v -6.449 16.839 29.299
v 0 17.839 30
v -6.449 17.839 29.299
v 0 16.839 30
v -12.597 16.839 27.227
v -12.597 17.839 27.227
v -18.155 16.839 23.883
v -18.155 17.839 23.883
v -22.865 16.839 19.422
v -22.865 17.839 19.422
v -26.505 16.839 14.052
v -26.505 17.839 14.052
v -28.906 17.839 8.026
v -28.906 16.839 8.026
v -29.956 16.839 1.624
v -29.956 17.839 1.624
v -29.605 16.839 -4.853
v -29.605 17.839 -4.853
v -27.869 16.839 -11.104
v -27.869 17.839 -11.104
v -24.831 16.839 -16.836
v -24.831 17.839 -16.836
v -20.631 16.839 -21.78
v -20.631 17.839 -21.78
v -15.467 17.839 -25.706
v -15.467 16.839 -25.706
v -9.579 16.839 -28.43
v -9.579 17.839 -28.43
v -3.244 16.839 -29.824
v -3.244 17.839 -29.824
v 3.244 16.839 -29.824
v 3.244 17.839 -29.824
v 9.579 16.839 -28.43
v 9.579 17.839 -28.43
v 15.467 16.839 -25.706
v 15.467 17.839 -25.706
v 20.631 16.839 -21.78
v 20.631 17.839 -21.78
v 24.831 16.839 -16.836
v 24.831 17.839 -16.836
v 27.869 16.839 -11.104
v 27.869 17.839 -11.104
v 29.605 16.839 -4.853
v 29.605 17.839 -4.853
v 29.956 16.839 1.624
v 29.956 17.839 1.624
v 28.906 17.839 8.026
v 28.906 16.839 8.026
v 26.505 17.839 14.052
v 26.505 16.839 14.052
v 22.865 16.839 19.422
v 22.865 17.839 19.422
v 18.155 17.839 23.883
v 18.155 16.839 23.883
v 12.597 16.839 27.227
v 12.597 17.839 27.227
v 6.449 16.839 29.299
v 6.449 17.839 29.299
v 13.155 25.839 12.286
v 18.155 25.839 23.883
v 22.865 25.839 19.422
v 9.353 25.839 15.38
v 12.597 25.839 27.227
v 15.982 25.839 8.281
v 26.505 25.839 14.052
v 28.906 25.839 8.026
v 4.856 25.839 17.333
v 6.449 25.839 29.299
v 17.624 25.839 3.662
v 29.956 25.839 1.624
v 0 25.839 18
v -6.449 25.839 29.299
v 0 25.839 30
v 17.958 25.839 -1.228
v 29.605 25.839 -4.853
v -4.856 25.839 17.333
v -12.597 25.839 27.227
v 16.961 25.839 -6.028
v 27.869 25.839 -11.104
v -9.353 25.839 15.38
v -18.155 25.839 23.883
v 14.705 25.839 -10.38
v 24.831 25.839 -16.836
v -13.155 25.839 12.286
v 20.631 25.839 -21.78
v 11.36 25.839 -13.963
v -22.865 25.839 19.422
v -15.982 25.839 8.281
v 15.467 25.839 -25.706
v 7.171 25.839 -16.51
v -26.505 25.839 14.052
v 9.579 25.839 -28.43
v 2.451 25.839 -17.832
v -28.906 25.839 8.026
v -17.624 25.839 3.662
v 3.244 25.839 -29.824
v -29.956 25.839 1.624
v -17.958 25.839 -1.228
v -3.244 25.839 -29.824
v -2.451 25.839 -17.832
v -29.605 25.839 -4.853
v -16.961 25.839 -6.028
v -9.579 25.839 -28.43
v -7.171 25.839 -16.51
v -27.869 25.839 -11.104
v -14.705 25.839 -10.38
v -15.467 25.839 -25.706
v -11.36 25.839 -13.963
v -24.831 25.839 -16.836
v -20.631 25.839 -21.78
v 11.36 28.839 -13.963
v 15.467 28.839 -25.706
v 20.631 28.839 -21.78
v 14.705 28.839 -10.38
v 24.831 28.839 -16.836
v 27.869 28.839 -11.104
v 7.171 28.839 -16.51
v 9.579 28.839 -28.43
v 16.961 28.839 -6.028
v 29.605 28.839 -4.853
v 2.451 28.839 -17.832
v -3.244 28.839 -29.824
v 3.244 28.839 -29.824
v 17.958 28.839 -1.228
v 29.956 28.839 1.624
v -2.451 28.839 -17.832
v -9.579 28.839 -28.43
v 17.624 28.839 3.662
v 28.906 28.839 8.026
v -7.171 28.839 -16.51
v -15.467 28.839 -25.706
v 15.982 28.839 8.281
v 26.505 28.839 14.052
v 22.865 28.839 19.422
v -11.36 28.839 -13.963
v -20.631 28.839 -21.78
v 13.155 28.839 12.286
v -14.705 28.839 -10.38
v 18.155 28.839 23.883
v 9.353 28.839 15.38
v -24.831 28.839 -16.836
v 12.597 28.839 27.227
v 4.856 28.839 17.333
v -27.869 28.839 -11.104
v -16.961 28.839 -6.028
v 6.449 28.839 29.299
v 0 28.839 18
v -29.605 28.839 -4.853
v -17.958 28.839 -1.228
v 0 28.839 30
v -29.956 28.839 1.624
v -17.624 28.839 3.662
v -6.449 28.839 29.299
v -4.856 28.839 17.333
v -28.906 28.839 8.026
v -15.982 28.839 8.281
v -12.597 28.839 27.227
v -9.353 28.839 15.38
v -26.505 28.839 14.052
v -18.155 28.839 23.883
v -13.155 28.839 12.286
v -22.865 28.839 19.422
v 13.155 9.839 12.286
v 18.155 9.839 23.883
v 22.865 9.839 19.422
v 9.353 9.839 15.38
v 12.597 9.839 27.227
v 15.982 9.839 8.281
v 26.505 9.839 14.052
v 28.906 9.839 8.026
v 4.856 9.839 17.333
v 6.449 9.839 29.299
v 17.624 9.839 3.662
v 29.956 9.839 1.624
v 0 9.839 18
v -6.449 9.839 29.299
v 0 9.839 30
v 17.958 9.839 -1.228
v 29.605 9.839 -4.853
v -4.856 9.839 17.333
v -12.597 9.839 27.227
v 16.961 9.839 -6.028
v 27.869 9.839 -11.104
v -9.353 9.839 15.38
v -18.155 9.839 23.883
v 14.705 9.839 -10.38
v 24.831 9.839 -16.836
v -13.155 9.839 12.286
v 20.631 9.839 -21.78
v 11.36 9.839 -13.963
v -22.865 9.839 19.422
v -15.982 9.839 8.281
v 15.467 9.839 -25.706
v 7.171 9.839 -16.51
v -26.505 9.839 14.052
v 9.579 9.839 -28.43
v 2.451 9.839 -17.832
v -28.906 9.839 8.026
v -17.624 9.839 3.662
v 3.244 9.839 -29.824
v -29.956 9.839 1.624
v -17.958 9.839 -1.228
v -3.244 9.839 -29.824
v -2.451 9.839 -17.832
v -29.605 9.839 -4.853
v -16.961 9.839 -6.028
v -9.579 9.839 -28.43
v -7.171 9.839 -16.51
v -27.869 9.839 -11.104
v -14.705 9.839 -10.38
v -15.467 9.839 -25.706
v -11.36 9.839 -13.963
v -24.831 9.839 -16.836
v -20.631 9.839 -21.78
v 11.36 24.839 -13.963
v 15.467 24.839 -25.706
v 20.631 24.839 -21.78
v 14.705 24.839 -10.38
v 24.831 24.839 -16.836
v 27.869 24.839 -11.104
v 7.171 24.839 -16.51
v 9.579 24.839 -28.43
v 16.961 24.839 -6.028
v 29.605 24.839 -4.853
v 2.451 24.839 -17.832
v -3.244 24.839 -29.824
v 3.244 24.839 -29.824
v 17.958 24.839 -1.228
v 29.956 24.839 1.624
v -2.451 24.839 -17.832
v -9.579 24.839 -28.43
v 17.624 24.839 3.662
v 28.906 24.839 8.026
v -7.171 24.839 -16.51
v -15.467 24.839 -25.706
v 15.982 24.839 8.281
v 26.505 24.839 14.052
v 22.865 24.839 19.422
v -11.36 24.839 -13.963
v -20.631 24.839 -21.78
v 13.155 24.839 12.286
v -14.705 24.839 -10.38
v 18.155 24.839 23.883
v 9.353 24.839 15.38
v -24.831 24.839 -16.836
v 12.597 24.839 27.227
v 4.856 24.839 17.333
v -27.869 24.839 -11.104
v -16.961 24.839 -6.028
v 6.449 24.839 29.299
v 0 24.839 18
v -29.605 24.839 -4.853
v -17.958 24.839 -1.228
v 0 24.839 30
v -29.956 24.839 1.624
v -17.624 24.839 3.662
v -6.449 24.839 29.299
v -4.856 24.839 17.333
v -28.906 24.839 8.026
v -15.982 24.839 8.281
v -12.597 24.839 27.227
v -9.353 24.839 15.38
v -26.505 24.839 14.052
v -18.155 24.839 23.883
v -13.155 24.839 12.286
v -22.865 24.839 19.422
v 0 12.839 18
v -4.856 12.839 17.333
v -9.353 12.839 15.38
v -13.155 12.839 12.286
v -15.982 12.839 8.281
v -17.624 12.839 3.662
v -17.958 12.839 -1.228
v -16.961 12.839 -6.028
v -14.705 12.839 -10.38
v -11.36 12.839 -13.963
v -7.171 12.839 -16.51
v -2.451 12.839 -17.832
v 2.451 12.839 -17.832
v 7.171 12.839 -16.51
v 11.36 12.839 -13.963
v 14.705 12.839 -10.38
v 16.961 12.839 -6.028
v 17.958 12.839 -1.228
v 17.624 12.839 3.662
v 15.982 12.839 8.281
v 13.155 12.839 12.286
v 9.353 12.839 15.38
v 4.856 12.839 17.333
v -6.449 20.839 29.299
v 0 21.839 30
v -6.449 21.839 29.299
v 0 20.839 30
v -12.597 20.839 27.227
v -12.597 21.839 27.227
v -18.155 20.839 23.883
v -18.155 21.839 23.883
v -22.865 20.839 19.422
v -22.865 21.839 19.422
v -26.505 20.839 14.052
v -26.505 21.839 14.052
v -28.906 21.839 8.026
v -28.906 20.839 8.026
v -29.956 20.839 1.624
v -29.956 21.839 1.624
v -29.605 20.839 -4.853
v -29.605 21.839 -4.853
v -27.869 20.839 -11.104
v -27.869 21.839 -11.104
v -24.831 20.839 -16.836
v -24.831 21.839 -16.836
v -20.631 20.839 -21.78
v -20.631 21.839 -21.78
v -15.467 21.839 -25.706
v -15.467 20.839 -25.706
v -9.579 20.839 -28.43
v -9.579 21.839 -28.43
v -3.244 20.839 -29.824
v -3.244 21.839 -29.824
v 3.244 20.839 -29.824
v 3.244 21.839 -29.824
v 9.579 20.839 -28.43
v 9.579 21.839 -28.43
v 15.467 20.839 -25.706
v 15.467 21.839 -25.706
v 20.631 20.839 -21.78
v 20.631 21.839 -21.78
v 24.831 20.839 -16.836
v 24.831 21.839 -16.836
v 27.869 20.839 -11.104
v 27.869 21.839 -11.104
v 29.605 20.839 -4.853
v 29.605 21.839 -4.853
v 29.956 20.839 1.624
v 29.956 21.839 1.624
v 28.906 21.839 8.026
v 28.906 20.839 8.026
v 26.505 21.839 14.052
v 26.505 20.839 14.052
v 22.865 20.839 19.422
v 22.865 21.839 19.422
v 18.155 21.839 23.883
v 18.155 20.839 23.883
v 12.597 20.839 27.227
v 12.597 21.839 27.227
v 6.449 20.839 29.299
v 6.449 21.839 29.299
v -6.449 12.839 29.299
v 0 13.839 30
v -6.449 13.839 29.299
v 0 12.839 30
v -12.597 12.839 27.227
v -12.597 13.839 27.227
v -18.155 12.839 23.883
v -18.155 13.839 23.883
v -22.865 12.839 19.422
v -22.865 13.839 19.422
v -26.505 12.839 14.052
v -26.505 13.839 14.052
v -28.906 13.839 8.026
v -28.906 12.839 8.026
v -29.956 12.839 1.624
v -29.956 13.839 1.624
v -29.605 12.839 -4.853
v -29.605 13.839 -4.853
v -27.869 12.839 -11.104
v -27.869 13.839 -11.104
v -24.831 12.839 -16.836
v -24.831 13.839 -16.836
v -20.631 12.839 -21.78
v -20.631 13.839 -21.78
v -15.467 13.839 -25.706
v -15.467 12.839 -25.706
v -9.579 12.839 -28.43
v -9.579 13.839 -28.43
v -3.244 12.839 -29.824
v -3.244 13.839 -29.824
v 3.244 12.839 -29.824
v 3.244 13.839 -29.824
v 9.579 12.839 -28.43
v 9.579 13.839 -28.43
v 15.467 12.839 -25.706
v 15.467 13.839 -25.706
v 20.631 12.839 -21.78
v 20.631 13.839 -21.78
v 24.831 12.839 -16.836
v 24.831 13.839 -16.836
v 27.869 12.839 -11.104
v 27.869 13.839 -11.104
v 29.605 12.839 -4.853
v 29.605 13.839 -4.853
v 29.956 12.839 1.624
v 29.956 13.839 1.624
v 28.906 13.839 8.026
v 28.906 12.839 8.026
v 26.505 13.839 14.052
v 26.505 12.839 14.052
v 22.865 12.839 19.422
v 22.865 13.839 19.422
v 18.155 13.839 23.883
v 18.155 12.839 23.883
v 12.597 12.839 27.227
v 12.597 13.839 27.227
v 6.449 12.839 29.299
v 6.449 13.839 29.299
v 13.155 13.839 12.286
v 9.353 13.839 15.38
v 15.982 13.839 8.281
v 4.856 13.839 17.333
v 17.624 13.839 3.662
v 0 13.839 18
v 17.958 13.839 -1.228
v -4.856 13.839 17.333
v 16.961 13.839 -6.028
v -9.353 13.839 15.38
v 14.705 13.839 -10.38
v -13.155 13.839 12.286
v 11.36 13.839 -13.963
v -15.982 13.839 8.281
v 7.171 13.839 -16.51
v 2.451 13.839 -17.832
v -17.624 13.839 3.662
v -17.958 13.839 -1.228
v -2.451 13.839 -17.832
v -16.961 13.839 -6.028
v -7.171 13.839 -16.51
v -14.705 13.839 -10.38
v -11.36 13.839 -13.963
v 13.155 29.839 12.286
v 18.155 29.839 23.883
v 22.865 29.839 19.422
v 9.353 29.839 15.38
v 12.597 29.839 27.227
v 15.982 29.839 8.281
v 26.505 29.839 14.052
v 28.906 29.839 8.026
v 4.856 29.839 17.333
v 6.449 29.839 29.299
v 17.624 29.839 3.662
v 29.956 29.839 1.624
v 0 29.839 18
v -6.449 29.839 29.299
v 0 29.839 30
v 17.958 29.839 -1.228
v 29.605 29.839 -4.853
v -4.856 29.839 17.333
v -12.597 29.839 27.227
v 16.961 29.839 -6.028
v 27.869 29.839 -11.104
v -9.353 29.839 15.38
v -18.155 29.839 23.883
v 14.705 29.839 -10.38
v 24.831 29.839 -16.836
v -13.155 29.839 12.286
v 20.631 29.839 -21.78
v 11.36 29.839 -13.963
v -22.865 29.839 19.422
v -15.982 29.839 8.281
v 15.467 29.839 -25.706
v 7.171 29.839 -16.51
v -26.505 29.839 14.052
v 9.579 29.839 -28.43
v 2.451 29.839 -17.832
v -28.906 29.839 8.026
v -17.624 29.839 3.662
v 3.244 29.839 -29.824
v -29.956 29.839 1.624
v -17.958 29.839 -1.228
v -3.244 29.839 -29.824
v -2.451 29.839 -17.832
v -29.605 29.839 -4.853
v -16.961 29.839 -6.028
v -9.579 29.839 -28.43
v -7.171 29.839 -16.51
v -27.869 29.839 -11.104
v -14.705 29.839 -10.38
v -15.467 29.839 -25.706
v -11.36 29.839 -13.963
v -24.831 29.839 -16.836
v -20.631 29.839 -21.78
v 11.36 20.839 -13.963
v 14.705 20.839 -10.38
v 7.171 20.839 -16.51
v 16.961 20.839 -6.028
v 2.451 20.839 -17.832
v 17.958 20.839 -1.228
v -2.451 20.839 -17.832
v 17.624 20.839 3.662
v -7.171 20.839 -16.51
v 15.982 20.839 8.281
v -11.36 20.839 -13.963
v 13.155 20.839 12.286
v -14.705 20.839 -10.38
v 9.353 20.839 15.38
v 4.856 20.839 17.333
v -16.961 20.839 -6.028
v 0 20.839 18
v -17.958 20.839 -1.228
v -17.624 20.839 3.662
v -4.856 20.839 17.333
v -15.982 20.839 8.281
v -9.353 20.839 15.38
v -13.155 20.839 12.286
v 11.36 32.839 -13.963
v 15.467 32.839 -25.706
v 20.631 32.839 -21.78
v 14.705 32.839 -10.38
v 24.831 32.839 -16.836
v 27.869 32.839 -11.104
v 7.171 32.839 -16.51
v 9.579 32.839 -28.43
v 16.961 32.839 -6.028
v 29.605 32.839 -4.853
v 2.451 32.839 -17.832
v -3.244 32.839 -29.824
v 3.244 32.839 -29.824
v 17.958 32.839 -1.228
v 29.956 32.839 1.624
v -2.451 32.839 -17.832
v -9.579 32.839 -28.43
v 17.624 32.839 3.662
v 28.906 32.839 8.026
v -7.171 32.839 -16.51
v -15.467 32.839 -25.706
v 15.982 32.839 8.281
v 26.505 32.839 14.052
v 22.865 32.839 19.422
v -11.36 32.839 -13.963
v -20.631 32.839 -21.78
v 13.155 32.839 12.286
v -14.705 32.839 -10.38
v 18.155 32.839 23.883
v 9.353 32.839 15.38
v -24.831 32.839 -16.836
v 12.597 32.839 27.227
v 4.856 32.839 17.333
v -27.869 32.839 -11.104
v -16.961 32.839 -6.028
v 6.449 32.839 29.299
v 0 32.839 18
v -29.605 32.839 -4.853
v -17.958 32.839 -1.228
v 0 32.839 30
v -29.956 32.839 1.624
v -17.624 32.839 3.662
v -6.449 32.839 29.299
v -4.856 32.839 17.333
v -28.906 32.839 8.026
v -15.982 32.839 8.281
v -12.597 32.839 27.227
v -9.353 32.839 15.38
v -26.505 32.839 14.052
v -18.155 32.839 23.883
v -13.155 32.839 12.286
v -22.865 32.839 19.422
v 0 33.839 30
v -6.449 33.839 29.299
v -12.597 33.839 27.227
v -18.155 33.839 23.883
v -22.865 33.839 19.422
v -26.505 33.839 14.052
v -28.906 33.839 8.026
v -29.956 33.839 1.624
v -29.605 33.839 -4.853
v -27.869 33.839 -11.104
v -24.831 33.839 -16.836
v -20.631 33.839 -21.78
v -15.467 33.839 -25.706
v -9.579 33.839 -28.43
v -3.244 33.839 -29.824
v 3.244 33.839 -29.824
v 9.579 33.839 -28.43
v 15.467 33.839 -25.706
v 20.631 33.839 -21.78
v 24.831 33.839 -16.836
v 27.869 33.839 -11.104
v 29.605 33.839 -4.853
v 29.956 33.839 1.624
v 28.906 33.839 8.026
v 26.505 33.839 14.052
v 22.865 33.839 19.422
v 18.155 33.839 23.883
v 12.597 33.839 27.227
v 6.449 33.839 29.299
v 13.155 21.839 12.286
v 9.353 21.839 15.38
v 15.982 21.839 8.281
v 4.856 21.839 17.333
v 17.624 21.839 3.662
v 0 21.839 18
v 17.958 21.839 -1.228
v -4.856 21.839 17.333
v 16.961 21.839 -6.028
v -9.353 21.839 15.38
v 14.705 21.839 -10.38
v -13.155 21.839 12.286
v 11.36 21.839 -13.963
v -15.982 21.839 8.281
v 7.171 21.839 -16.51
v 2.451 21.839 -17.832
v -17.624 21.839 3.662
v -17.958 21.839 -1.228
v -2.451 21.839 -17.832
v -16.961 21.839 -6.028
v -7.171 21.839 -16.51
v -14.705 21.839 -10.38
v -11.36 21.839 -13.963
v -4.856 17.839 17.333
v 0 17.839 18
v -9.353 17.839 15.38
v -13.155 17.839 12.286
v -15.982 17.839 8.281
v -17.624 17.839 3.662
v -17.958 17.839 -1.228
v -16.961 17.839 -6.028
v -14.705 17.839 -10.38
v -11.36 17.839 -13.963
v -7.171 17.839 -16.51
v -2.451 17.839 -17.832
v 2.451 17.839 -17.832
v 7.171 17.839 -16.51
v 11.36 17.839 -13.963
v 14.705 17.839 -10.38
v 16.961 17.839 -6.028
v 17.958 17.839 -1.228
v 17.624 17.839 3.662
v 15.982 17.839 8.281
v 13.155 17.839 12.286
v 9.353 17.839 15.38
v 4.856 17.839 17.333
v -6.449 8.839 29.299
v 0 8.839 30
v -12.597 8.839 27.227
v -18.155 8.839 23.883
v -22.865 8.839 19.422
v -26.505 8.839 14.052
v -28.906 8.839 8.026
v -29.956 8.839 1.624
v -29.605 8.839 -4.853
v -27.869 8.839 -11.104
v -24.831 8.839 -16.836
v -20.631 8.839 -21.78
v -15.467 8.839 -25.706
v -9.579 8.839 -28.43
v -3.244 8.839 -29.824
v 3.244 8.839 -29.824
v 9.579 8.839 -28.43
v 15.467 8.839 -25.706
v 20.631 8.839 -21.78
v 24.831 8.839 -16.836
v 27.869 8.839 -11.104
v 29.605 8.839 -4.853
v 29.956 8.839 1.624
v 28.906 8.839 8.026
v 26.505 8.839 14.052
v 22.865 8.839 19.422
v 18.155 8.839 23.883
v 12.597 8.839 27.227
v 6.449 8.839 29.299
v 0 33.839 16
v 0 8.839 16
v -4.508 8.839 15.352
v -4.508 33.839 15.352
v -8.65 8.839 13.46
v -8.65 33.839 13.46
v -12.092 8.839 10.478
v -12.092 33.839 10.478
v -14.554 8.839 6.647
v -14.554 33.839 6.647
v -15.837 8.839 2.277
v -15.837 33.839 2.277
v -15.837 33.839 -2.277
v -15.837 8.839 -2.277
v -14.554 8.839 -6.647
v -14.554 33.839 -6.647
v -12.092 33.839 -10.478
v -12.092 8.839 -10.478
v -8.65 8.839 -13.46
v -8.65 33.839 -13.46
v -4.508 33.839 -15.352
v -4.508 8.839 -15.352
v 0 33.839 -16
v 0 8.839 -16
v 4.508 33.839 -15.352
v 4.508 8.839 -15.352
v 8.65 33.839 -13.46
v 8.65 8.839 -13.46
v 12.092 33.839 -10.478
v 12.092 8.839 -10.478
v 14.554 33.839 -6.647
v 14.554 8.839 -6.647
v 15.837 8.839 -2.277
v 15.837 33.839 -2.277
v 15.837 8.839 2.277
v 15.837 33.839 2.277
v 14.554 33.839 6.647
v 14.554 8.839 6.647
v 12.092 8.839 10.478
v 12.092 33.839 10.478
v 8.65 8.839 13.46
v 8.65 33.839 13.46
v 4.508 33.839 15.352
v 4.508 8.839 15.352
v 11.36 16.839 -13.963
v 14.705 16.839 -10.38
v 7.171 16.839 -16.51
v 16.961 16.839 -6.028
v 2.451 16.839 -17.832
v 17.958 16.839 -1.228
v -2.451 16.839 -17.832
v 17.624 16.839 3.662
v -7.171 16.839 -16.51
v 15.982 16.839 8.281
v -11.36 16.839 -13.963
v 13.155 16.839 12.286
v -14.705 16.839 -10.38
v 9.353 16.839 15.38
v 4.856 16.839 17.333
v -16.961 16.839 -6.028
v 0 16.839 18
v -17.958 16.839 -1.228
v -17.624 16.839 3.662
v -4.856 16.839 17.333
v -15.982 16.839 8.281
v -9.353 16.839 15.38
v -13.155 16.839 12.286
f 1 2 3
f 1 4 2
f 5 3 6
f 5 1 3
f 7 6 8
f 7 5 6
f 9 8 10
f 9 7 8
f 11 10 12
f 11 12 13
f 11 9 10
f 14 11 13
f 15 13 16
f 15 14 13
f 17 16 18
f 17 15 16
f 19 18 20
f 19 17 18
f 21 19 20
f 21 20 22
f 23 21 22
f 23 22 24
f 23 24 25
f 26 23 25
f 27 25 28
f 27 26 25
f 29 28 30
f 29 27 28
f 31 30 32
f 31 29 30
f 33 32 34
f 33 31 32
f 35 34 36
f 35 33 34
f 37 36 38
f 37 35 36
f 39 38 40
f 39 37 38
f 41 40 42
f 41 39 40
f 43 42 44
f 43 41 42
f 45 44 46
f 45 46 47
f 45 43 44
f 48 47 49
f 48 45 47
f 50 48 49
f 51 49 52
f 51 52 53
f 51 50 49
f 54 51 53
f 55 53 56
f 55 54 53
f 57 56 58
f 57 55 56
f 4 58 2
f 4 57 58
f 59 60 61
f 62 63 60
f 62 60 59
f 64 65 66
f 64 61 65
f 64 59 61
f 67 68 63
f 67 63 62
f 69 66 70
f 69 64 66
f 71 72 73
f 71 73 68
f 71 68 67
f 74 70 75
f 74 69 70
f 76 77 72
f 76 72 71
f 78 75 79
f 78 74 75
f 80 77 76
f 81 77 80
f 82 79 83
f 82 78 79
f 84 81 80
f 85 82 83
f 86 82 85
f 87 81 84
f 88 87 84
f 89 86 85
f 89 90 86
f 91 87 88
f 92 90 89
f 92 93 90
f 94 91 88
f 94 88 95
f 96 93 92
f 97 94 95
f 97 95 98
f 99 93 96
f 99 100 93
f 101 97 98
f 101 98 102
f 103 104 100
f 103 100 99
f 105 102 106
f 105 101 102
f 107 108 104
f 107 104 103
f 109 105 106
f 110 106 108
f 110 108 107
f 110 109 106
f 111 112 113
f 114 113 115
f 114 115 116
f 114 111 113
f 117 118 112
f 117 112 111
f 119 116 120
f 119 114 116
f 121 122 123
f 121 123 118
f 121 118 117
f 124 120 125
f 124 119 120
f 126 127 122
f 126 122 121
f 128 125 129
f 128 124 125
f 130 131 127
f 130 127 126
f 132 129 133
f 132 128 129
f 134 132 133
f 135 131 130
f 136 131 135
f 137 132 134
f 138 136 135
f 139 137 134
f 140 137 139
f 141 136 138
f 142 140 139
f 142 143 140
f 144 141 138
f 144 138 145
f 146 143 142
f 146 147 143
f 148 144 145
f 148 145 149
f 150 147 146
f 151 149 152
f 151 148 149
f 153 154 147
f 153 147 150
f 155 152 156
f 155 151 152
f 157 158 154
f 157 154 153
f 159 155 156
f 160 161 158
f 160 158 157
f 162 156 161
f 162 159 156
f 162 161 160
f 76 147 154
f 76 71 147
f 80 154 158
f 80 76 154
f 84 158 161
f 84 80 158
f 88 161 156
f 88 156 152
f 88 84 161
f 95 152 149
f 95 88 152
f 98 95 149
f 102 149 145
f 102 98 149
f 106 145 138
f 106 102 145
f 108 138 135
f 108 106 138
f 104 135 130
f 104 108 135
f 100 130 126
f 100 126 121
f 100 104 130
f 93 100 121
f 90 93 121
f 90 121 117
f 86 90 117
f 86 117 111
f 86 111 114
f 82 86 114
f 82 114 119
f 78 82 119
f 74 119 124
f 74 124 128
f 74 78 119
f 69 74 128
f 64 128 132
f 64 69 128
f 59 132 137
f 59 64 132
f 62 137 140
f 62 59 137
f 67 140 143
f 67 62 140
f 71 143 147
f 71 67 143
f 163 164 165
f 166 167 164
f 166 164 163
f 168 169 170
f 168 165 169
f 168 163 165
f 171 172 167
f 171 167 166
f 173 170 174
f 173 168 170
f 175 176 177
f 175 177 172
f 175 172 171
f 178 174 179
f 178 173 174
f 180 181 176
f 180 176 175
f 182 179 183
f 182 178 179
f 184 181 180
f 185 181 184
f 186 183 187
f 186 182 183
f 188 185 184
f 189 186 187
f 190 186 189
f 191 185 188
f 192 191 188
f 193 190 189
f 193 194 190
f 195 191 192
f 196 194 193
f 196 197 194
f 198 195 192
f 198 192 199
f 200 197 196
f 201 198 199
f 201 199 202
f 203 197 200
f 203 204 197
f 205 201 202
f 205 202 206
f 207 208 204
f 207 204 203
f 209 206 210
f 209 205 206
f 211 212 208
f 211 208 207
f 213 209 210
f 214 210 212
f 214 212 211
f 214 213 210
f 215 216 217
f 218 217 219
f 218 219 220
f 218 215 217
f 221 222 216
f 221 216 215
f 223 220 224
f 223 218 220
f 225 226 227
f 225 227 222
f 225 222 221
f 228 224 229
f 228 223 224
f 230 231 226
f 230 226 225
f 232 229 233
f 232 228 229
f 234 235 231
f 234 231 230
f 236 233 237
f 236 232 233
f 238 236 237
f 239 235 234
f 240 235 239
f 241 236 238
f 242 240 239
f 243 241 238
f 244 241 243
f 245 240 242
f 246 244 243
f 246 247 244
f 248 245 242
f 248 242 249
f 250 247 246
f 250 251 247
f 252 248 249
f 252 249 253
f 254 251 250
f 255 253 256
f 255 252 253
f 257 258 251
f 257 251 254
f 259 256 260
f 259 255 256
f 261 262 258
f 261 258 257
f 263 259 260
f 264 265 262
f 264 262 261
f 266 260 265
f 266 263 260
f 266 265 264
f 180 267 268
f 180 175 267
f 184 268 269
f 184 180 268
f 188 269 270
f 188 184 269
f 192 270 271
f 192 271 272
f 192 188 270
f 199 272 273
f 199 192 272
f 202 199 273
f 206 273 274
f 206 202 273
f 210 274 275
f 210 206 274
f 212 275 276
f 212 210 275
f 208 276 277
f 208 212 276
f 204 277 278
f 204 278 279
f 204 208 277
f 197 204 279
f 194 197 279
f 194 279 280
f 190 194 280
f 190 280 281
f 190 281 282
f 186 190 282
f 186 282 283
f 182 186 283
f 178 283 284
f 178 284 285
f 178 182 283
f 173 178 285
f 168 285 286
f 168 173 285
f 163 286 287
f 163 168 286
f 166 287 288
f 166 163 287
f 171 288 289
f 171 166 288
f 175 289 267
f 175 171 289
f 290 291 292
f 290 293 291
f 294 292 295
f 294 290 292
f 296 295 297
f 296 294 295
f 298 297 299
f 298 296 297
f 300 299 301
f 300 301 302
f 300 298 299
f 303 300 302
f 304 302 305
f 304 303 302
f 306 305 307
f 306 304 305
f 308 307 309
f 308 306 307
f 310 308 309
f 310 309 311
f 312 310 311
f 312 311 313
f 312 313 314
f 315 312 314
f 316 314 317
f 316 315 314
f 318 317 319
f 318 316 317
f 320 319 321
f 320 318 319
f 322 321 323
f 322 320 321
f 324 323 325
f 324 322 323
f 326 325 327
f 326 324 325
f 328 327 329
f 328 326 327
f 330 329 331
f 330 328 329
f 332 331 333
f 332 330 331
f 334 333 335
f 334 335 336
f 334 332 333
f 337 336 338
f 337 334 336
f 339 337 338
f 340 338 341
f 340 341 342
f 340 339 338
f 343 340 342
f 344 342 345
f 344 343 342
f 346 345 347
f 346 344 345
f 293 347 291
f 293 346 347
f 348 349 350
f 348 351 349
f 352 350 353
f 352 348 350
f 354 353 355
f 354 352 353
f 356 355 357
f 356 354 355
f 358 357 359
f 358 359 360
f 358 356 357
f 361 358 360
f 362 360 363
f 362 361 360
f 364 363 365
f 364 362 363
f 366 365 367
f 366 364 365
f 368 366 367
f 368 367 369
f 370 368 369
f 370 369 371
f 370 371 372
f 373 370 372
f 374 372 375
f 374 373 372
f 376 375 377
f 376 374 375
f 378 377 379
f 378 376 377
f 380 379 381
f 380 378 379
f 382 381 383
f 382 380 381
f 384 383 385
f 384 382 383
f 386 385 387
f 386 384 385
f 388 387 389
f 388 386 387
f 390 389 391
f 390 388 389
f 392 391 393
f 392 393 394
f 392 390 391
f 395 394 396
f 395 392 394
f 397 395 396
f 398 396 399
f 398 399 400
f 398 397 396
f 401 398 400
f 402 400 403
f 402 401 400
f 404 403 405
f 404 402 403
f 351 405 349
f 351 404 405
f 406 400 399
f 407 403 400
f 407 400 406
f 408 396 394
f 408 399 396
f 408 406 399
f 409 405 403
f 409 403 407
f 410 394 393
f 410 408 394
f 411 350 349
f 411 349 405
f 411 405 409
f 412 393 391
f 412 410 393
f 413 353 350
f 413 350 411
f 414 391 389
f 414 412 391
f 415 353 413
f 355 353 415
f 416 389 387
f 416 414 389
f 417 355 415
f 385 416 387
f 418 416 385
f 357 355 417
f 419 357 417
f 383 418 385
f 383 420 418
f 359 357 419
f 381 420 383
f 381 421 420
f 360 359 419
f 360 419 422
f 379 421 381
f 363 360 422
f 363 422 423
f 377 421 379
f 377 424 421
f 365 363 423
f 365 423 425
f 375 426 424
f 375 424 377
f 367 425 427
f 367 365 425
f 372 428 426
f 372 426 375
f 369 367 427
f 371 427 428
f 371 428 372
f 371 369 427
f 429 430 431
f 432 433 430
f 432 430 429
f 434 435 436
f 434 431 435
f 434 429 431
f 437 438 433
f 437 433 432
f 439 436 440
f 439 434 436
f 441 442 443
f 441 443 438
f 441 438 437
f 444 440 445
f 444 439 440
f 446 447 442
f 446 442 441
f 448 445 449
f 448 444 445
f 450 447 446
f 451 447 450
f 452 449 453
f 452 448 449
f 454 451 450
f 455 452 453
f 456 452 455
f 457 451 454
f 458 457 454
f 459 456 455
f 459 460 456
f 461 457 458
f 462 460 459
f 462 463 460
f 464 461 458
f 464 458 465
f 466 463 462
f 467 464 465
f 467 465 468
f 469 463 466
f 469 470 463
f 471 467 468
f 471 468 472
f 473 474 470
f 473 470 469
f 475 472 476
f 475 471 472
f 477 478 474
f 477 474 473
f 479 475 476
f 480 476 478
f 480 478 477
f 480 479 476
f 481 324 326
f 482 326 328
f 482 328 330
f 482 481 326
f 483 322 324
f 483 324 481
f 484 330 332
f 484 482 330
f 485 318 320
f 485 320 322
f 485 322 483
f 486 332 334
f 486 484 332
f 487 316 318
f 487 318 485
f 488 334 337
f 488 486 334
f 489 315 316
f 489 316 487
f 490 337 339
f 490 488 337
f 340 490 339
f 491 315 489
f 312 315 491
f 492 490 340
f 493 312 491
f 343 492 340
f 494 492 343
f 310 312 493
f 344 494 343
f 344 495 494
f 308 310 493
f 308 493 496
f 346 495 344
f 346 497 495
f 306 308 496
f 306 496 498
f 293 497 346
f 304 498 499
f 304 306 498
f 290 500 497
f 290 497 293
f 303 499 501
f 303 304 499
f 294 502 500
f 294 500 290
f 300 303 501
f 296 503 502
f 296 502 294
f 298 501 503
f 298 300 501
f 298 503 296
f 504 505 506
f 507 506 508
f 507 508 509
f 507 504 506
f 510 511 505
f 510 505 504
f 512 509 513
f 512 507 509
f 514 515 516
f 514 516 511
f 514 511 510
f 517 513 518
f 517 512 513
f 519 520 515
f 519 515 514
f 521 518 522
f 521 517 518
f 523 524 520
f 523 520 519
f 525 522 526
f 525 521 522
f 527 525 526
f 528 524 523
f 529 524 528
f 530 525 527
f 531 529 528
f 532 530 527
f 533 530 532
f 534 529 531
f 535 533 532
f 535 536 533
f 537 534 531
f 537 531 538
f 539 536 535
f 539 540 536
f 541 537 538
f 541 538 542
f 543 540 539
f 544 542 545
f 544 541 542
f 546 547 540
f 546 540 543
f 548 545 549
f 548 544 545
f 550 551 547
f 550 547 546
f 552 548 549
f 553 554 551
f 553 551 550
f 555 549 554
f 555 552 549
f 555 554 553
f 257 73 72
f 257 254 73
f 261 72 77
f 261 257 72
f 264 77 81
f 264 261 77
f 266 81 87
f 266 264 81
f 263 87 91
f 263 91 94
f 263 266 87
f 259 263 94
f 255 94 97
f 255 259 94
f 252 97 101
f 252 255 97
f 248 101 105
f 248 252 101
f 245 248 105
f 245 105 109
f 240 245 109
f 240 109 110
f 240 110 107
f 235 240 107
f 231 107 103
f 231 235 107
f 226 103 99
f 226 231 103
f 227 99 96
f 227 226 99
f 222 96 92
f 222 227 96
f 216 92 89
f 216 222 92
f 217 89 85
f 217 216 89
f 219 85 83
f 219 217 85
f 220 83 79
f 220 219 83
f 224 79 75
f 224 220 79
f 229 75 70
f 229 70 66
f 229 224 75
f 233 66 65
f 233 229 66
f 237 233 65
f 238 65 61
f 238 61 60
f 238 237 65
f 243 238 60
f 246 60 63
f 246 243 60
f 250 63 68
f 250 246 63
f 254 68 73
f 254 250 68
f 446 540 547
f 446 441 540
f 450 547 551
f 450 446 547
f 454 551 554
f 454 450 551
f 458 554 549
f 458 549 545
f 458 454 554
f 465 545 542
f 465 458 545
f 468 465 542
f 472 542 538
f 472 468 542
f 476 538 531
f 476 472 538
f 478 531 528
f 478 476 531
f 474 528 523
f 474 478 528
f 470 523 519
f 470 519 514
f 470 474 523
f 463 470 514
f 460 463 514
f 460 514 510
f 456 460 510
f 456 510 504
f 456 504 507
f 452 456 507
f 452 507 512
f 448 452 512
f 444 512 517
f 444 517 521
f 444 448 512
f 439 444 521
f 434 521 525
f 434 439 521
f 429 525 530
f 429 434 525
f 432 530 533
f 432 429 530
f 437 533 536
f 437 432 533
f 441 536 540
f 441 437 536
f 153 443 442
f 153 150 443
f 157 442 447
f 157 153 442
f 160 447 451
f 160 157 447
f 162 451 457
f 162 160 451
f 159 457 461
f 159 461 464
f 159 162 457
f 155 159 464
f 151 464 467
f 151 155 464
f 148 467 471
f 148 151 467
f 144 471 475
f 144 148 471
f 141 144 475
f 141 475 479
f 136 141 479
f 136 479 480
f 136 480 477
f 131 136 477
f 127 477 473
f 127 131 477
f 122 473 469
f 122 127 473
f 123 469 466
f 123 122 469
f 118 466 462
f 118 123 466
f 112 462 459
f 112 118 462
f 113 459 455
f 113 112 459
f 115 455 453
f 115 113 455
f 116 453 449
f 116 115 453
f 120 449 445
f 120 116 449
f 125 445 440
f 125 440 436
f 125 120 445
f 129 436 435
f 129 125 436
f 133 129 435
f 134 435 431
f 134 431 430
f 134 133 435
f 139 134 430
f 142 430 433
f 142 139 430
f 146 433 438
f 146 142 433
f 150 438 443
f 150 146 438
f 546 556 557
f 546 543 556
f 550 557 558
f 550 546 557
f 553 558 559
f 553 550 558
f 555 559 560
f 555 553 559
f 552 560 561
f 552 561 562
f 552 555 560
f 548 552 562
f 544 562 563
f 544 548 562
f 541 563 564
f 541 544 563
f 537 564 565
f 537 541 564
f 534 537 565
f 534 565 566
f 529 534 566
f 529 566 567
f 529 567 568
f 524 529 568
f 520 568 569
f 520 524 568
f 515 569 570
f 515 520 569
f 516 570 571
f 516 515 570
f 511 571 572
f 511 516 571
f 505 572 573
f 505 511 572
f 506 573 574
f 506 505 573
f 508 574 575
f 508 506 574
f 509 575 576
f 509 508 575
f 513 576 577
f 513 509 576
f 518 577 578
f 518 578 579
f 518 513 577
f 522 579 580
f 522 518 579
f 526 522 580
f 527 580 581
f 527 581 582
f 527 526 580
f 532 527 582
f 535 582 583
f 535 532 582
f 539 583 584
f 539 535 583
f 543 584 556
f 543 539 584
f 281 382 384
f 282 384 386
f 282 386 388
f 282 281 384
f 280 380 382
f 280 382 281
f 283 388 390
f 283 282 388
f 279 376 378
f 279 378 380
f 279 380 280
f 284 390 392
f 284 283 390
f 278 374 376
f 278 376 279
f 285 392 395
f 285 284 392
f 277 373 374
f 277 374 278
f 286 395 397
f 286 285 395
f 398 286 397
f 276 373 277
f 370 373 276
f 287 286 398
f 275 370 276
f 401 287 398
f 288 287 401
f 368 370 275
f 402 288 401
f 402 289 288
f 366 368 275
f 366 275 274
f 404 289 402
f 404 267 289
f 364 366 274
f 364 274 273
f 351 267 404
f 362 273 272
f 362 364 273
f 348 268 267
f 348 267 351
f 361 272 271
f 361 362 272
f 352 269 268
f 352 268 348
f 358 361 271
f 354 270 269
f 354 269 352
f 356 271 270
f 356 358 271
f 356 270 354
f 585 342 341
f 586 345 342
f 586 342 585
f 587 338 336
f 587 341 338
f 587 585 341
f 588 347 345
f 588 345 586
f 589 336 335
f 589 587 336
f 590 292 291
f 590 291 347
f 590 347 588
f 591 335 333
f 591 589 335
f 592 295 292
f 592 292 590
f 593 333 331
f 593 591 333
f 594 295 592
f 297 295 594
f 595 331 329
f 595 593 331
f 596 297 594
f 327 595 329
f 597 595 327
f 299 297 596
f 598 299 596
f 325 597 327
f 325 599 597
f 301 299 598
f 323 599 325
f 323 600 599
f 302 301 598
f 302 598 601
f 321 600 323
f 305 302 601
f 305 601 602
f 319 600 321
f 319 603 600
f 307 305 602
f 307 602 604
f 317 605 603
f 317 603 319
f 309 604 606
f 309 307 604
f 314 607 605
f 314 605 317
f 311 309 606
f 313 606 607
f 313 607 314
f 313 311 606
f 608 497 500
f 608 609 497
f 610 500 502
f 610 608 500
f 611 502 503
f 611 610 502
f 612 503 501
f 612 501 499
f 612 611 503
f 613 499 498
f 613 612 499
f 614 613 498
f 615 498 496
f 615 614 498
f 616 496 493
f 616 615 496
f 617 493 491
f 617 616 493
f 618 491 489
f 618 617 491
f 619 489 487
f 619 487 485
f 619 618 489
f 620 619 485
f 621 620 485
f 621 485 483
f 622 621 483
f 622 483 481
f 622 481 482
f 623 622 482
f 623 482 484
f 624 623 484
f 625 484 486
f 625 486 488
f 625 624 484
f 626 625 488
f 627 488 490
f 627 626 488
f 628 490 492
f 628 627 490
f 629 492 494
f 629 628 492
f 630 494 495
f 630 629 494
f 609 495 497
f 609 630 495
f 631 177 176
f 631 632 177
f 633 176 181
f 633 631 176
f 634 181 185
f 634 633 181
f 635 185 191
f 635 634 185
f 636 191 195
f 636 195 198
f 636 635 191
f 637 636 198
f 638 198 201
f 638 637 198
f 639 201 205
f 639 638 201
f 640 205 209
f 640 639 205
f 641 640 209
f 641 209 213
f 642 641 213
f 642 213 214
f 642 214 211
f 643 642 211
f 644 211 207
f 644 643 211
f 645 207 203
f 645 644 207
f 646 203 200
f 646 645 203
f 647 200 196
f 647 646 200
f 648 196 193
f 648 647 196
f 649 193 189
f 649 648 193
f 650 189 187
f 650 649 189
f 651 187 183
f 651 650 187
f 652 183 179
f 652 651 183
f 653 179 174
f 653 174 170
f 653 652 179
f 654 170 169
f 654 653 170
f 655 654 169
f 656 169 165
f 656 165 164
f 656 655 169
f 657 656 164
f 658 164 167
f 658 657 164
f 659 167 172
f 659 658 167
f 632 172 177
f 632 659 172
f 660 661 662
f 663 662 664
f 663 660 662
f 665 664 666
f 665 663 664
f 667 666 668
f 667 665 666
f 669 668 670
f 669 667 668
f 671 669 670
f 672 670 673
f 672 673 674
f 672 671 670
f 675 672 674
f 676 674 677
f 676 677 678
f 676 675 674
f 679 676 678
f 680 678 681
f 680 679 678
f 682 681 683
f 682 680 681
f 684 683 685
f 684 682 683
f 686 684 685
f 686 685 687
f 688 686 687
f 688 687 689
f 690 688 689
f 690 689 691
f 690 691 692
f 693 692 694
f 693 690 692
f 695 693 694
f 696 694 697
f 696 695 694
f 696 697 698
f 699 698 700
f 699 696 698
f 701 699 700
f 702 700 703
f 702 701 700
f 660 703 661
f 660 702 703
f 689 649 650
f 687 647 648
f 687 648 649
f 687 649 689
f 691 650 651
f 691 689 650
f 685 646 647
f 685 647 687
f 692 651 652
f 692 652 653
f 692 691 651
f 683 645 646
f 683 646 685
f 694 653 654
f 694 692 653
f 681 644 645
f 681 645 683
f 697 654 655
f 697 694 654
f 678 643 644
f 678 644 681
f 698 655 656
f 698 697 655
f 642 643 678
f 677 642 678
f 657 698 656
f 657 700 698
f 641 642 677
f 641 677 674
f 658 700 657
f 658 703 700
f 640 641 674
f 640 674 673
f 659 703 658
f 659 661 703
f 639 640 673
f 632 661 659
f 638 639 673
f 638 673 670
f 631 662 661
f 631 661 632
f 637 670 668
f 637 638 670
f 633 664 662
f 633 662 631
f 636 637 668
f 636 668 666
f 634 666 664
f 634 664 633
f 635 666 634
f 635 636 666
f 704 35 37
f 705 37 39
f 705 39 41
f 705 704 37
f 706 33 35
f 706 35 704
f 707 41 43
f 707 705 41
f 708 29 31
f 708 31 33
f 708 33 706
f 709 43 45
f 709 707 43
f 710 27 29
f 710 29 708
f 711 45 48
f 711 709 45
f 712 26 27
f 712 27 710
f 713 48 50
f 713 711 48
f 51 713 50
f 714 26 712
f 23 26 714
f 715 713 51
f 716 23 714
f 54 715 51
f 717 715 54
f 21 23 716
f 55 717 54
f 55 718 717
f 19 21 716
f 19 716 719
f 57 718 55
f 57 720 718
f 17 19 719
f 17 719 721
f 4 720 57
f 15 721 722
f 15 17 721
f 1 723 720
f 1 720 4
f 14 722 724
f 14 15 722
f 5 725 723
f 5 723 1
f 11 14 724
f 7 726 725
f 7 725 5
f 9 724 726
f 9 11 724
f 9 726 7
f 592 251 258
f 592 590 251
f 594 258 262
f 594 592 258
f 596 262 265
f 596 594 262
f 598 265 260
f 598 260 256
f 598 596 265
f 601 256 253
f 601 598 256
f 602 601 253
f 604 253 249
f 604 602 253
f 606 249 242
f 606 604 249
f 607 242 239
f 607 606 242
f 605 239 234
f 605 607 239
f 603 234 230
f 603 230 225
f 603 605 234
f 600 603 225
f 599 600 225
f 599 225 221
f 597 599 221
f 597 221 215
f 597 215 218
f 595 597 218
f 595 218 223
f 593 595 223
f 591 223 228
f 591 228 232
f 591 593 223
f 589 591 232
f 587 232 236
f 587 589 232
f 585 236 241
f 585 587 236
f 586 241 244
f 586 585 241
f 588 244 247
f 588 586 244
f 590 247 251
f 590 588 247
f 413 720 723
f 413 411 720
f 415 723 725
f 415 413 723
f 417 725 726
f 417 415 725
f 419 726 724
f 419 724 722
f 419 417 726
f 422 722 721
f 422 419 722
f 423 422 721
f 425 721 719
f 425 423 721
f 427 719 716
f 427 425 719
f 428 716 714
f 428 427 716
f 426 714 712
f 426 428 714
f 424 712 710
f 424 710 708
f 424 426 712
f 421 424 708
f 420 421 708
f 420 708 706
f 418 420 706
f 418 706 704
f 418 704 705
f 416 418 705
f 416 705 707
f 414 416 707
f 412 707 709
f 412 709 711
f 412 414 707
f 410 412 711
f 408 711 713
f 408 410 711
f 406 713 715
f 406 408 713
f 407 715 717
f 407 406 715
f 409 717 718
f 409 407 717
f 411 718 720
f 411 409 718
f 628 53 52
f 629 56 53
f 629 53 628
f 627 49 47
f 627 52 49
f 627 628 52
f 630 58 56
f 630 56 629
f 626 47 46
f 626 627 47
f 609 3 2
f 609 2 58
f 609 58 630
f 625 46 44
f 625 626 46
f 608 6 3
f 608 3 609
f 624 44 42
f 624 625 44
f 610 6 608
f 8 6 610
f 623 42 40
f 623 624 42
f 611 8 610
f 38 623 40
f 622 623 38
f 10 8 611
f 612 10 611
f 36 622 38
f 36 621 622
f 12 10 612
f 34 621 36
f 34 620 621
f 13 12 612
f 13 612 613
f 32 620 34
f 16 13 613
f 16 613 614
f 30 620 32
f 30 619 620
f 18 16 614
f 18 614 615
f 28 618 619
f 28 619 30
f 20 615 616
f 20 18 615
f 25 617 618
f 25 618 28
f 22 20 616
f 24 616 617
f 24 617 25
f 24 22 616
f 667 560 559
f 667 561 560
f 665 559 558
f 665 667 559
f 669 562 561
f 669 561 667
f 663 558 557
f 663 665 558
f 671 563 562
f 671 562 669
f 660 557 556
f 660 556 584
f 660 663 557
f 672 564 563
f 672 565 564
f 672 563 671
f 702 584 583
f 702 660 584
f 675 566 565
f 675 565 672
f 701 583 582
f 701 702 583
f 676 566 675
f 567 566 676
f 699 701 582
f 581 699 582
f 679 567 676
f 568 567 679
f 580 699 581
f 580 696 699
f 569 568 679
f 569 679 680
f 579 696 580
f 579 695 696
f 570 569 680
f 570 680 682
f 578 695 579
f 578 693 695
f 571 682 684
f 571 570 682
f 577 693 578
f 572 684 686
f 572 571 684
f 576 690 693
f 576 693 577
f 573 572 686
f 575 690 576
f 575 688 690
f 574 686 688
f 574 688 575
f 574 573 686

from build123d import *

# Parameters (mm, degrees)
LPATTERN1_COUNT    = 7
LPATTERN1_PITCH    = 4
SKETCH3_R          = 19.047367533
CUT_EXTRUDE3_DEPTH = 4


with BuildPart() as part:
    # Sketch1 → Revolve1 (revolve)
    with BuildSketch(Plane(origin=(0, 0, 0), x_dir=(0, 0, -1), z_dir=(1, 0, 0))):
        Polygon((-18, 13.838658872), (-18, 9.838658872), (-30, 9.838658872), (-30, 8.838658872), (-16, 8.838658872), (-16, 13.838658872), align=None)
    revolve1 = revolve(axis=Axis((0, 28.058626224, 0), (0, -1, 0)))

    # LPattern1: Revolve1 ×7
    with Locations(*[(0, i * LPATTERN1_PITCH, 0) for i in range(1, LPATTERN1_COUNT)]):
        add(revolve1)

    # Sketch3 → Cut-Extrude3 (cut)
    with BuildSketch(Plane(origin=(0, 37.838658872, 0), x_dir=(1, 0, 0), z_dir=(0, 1, 0))):
        Circle(SKETCH3_R)
    extrude(amount=-CUT_EXTRUDE3_DEPTH, mode=Mode.SUBTRACT)


solid = part.part
